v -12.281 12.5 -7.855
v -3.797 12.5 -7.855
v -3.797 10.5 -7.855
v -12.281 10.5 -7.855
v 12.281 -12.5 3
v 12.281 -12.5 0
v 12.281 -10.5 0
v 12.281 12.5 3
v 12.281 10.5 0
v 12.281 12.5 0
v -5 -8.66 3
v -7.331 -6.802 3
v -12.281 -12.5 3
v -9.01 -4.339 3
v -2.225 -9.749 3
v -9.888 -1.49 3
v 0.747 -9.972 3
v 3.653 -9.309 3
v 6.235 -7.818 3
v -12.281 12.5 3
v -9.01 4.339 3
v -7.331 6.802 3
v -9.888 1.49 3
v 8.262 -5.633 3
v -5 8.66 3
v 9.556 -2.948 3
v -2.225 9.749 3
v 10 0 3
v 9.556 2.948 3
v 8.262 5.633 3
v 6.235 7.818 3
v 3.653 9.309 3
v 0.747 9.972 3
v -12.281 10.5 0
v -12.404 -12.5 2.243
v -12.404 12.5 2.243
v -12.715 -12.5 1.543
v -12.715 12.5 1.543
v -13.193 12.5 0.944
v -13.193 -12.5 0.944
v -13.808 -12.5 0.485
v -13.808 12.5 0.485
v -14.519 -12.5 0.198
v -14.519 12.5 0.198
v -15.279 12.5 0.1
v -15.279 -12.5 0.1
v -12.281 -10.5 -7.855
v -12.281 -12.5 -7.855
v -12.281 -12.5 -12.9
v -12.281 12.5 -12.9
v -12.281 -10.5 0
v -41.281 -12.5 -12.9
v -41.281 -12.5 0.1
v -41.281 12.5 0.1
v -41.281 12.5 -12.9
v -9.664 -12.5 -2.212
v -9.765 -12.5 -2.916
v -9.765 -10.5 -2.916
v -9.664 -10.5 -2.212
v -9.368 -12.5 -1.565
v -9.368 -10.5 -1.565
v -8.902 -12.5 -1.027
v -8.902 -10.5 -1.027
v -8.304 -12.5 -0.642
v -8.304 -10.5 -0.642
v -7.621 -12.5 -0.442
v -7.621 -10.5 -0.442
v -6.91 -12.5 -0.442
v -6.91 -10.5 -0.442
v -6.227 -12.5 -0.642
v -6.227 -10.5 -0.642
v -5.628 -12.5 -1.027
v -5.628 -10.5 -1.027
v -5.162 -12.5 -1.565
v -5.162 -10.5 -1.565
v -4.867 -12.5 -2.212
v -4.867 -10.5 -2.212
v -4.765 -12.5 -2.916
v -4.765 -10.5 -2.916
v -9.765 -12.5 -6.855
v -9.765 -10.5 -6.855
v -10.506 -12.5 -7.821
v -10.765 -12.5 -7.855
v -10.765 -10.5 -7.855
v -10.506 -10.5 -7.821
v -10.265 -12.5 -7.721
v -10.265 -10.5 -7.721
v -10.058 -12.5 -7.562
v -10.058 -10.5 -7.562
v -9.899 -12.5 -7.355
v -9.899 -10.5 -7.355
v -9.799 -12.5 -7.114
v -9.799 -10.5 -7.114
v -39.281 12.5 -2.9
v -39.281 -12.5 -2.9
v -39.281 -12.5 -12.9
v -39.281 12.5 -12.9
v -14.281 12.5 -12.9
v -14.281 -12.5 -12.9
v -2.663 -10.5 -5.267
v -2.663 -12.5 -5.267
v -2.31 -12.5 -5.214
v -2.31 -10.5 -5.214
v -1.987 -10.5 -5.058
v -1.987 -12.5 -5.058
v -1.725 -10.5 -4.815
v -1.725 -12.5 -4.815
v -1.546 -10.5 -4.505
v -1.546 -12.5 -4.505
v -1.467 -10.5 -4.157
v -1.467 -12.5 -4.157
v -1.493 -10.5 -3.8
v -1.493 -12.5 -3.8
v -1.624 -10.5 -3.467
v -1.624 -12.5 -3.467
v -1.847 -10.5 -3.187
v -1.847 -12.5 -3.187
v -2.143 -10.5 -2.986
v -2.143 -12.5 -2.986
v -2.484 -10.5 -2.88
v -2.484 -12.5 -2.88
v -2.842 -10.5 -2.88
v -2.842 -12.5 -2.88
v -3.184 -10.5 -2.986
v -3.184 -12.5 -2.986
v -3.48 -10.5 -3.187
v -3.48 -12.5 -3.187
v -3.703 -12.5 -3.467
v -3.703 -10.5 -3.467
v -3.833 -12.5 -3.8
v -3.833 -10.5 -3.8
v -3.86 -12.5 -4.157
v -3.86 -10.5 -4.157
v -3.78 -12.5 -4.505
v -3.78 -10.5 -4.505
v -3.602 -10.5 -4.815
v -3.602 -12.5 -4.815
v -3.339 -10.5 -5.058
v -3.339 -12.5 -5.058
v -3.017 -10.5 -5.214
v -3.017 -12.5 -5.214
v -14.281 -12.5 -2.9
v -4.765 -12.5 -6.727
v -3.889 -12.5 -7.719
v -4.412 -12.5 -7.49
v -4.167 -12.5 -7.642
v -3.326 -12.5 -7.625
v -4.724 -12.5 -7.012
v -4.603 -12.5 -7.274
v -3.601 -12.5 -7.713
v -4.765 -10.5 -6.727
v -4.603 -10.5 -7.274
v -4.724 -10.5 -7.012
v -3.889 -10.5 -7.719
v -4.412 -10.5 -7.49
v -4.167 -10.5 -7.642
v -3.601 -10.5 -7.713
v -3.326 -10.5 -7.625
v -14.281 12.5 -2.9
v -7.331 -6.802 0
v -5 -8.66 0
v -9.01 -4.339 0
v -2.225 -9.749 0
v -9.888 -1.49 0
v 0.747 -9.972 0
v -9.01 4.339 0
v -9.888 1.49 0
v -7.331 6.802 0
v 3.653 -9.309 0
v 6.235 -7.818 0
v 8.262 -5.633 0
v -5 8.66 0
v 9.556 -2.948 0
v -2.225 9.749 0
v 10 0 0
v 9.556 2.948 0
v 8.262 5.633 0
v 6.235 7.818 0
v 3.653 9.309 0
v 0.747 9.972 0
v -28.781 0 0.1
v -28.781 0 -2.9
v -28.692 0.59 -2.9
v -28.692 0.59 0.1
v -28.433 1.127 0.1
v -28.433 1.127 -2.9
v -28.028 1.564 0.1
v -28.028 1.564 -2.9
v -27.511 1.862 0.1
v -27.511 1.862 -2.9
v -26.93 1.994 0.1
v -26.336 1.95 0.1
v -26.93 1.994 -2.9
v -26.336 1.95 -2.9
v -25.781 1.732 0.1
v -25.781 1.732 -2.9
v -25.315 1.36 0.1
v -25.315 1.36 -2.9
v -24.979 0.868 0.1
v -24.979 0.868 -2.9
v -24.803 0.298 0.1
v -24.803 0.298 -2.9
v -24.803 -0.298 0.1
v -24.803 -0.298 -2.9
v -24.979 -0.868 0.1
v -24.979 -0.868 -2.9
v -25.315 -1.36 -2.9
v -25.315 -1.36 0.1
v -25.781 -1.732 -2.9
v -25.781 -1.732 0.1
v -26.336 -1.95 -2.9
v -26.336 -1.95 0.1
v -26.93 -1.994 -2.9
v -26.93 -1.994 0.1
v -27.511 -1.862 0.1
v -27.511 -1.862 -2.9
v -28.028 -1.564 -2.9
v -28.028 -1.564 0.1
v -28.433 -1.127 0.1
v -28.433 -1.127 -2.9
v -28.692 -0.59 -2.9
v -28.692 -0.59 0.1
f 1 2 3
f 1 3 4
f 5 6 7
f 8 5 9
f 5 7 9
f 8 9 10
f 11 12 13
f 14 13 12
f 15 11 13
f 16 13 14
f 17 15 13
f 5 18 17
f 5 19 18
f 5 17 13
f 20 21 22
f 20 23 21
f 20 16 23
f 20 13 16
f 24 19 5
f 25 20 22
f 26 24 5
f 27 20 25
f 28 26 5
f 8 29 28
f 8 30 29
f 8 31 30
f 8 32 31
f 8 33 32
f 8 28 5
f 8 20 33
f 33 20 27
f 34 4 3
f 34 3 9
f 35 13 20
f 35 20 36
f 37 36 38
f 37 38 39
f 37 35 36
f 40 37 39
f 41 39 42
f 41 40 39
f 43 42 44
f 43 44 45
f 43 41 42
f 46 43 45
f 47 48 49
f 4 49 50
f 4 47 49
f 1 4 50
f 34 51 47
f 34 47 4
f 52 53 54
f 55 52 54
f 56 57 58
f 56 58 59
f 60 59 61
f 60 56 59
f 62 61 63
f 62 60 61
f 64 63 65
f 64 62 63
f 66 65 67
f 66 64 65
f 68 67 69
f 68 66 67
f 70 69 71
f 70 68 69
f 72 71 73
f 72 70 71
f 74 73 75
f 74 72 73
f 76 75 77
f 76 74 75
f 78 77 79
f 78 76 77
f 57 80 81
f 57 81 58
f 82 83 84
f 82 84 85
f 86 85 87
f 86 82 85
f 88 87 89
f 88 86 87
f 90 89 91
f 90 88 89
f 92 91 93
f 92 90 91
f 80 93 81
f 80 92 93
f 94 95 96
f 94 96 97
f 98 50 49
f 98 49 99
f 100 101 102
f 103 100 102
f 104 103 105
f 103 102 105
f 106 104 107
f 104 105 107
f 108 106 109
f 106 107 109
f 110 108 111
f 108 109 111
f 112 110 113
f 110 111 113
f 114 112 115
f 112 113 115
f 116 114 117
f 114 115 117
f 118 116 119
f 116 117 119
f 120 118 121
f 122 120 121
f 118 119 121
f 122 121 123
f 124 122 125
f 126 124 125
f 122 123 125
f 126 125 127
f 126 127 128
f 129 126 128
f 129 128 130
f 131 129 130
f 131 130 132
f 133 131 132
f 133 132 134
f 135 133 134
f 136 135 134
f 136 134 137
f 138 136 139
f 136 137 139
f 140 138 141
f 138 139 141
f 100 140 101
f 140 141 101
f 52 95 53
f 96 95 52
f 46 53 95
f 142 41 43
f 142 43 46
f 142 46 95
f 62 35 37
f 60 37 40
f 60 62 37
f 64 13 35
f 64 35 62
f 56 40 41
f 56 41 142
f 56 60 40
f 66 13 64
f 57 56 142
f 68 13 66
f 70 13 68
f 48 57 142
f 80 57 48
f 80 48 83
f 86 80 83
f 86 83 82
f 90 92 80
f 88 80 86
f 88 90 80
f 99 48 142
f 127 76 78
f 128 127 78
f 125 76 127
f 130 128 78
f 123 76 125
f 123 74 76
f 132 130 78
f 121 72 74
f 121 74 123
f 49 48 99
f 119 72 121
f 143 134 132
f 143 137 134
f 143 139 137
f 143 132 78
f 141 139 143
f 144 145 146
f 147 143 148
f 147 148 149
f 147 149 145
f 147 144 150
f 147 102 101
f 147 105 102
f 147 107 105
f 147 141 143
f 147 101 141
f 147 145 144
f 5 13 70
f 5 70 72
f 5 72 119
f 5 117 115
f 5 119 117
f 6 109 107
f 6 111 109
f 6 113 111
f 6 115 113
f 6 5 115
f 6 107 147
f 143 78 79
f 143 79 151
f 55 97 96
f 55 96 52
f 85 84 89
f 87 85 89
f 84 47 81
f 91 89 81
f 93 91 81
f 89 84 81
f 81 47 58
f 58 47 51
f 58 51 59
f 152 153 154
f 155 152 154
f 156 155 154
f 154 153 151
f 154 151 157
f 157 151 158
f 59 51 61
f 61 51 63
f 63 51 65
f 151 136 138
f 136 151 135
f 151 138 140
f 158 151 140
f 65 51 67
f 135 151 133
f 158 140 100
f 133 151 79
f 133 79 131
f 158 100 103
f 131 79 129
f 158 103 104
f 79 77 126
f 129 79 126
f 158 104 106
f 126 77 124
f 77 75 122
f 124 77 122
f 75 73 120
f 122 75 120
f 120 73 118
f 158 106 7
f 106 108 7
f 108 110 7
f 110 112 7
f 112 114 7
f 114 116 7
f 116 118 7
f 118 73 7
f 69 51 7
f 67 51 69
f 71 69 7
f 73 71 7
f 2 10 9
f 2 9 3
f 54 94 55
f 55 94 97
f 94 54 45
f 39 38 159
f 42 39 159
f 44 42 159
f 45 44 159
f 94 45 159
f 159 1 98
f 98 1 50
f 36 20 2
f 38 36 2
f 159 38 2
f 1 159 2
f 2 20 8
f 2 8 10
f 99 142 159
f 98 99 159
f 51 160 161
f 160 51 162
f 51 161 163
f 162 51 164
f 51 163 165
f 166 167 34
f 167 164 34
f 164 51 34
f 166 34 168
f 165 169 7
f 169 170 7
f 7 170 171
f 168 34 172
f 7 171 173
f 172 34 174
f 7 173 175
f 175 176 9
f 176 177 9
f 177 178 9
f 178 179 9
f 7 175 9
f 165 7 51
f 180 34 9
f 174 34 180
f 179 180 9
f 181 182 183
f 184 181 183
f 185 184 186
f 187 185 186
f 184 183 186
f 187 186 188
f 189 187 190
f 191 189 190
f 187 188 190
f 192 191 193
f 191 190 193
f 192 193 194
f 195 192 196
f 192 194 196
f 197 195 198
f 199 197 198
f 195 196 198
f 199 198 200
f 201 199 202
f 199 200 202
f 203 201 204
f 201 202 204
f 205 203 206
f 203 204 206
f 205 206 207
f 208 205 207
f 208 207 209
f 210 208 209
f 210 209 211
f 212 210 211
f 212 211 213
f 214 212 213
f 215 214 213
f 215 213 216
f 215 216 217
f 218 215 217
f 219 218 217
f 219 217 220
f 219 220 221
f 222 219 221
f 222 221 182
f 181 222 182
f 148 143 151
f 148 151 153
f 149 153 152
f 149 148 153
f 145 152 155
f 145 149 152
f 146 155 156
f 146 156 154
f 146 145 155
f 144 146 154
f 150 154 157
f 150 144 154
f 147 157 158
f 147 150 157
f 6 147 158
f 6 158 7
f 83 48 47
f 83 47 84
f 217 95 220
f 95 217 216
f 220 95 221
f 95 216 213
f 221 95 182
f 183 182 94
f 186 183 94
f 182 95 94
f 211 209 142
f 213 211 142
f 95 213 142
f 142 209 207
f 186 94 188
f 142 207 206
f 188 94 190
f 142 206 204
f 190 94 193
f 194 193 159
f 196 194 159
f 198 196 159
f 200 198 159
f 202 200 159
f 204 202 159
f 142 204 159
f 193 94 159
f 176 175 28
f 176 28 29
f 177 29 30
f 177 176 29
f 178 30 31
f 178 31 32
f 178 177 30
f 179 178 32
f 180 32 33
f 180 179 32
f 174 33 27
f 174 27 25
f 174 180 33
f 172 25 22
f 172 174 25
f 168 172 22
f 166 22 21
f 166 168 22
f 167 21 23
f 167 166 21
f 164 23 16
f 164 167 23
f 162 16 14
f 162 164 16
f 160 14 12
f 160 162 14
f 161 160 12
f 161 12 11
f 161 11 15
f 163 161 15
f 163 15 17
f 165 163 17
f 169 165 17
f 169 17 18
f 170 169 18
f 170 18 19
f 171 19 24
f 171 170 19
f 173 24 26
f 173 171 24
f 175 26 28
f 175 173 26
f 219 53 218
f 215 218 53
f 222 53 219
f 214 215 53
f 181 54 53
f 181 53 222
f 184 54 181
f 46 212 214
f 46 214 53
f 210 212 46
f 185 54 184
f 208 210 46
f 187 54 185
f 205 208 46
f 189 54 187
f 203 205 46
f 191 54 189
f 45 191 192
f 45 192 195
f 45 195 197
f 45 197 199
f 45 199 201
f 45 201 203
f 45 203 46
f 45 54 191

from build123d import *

# Parameters (mm, degrees)
SKETCH_1_W          = 24.561403508
SKETCH_1_H          = 25
SKETCH_1_R          = 10
EXTRUDE_1_DEPTH     = 3
EXTRUDE_START       = -2.9
SKETCH_2_W          = 29
SKETCH_2_H          = 25
EXTRUDE_2_DEPTH     = 3
SKETCH_4_W          = 2
SKETCH_4_H          = 25
EXTRUDE_3_DEPTH     = 10
EXTRUDE_4_DEPTH     = 2
SKETCH_6_R          = 1.2
EXTRUDE_5_DEPTH     = 2
SKETCH_7_R          = 2
CUT_EXTRUDE_1_DEPTH = 45.275798551
FILLET_1_R          = 3


with BuildPart() as part:
    # Эскиз1 → Бобышка-Вытянуть1 (new body)
    with BuildSketch(Plane.XY):
        Rectangle(SKETCH_1_W, SKETCH_1_H)
        Circle(SKETCH_1_R, mode=Mode.SUBTRACT)
    extrude(amount=EXTRUDE_1_DEPTH)

    # Эскиз2 → Бобышка-Вытянуть2 (add)
    with BuildSketch(Plane.XY.offset(3).offset(EXTRUDE_START)):
        with Locations((-26.780701754, 0)):
            Rectangle(SKETCH_2_W, SKETCH_2_H)
    extrude(amount=-EXTRUDE_2_DEPTH)

    # Эскиз4 → Бобышка-Вытянуть3 (add)
    with BuildSketch(Plane(origin=(0, 0, -2.9), x_dir=(-1, 0, 0), z_dir=(0, 0, -1))):
        with Locations((13.280701754, 0)):
            Rectangle(SKETCH_4_W, SKETCH_4_H)
        with Locations((40.280701754, 0)):
            Rectangle(SKETCH_4_W, SKETCH_4_H)
    extrude(amount=EXTRUDE_3_DEPTH)

    # Эскиз5 → Бобышка-Вытянуть4 (add)
    with BuildSketch(Plane(origin=(0, 12.5, 0), x_dir=(1, 0, 0), z_dir=(0, 1, 0))):
        Polygon((-14.280701754, 7.855101529), (-14.280701754, -0.1), (-12.280701754, -0.1), (-12.280701754, -3), (12.280701754, -3), (12.280701754, 0), (-3.796991433, 7.855101529), align=None)
    extrude(amount=-EXTRUDE_4_DEPTH)

    # Эскиз6 → Бобышка-Вытянуть5 (add)
    with BuildSketch(Plane.XZ.offset(12.5)):
        with BuildLine():
            Line((-12.280701754, 0), (-12.280701754, -7.855101529))
            Line((-12.280701754, -7.855101529), (-10.765310979, -7.855101529))
            ThreePointArc((-10.765310979, -7.855101529), (-10.058204198, -7.56220831), (-9.765310979, -6.855101529))
            Line((-9.765310979, -6.855101529), (-9.765310979, -2.916331119))
            ThreePointArc((-9.765310979, -2.916331119), (-7.265310979, -0.416331119), (-4.765310979, -2.916331119))
            Line((-4.765310979, -2.916331119), (-4.765310979, -6.726653445))
            ThreePointArc((-4.765310979, -6.726653445), (-4.294942972, -7.574880981), (-3.326331075, -7.625150325))
            Line((-3.326331075, -7.625150325), (12.280701754, 0))
            Line((12.280701754, 0), (-12.280701754, 0))
        make_face()
        with Locations(Location((-2.663311188, -4.066950409, 0), (0, 0, 270))):
            Circle(SKETCH_6_R, mode=Mode.SUBTRACT)
    extrude(amount=-EXTRUDE_5_DEPTH)

    # Эскиз7 → Вырез-Вытянуть1 (cut, through all)
    with BuildSketch(Plane(origin=(0, 0, -2.9), x_dir=(-1, 0, 0), z_dir=(0, 0, -1))):
        with Locations((26.780701754, 0)):
            Circle(SKETCH_7_R)
    extrude(amount=-CUT_EXTRUDE_1_DEPTH, mode=Mode.SUBTRACT)

    # Скругление1
    # the kernel refuses this fillet: 3 mm, written as the material it adds along each edge
    with BuildSketch(Plane(origin=(-12.280701754, -12.5, 0.1), x_dir=(0, 0, 1), z_dir=(0, 1, 0))) as fillet_1_piece_1:
        with BuildLine():
            CenterArc((3, -2.99833287), FILLET_1_R, 91.910213172, 88.089786828)
            Line((0, -2.99833287), (-0.06, -2.99833287))
            Line((-0.06, -2.99833287), (-0.06, 0))
            Line((-0.06, 0), (0, 0.06))
            ThreePointArc((0, 0.06), (1.45, 0.06), (2.898, 0.059966657))
            Line((2.898, 0.059966657), (2.9, 0))
        make_face()
    extrude(amount=25)


solid = part.part
